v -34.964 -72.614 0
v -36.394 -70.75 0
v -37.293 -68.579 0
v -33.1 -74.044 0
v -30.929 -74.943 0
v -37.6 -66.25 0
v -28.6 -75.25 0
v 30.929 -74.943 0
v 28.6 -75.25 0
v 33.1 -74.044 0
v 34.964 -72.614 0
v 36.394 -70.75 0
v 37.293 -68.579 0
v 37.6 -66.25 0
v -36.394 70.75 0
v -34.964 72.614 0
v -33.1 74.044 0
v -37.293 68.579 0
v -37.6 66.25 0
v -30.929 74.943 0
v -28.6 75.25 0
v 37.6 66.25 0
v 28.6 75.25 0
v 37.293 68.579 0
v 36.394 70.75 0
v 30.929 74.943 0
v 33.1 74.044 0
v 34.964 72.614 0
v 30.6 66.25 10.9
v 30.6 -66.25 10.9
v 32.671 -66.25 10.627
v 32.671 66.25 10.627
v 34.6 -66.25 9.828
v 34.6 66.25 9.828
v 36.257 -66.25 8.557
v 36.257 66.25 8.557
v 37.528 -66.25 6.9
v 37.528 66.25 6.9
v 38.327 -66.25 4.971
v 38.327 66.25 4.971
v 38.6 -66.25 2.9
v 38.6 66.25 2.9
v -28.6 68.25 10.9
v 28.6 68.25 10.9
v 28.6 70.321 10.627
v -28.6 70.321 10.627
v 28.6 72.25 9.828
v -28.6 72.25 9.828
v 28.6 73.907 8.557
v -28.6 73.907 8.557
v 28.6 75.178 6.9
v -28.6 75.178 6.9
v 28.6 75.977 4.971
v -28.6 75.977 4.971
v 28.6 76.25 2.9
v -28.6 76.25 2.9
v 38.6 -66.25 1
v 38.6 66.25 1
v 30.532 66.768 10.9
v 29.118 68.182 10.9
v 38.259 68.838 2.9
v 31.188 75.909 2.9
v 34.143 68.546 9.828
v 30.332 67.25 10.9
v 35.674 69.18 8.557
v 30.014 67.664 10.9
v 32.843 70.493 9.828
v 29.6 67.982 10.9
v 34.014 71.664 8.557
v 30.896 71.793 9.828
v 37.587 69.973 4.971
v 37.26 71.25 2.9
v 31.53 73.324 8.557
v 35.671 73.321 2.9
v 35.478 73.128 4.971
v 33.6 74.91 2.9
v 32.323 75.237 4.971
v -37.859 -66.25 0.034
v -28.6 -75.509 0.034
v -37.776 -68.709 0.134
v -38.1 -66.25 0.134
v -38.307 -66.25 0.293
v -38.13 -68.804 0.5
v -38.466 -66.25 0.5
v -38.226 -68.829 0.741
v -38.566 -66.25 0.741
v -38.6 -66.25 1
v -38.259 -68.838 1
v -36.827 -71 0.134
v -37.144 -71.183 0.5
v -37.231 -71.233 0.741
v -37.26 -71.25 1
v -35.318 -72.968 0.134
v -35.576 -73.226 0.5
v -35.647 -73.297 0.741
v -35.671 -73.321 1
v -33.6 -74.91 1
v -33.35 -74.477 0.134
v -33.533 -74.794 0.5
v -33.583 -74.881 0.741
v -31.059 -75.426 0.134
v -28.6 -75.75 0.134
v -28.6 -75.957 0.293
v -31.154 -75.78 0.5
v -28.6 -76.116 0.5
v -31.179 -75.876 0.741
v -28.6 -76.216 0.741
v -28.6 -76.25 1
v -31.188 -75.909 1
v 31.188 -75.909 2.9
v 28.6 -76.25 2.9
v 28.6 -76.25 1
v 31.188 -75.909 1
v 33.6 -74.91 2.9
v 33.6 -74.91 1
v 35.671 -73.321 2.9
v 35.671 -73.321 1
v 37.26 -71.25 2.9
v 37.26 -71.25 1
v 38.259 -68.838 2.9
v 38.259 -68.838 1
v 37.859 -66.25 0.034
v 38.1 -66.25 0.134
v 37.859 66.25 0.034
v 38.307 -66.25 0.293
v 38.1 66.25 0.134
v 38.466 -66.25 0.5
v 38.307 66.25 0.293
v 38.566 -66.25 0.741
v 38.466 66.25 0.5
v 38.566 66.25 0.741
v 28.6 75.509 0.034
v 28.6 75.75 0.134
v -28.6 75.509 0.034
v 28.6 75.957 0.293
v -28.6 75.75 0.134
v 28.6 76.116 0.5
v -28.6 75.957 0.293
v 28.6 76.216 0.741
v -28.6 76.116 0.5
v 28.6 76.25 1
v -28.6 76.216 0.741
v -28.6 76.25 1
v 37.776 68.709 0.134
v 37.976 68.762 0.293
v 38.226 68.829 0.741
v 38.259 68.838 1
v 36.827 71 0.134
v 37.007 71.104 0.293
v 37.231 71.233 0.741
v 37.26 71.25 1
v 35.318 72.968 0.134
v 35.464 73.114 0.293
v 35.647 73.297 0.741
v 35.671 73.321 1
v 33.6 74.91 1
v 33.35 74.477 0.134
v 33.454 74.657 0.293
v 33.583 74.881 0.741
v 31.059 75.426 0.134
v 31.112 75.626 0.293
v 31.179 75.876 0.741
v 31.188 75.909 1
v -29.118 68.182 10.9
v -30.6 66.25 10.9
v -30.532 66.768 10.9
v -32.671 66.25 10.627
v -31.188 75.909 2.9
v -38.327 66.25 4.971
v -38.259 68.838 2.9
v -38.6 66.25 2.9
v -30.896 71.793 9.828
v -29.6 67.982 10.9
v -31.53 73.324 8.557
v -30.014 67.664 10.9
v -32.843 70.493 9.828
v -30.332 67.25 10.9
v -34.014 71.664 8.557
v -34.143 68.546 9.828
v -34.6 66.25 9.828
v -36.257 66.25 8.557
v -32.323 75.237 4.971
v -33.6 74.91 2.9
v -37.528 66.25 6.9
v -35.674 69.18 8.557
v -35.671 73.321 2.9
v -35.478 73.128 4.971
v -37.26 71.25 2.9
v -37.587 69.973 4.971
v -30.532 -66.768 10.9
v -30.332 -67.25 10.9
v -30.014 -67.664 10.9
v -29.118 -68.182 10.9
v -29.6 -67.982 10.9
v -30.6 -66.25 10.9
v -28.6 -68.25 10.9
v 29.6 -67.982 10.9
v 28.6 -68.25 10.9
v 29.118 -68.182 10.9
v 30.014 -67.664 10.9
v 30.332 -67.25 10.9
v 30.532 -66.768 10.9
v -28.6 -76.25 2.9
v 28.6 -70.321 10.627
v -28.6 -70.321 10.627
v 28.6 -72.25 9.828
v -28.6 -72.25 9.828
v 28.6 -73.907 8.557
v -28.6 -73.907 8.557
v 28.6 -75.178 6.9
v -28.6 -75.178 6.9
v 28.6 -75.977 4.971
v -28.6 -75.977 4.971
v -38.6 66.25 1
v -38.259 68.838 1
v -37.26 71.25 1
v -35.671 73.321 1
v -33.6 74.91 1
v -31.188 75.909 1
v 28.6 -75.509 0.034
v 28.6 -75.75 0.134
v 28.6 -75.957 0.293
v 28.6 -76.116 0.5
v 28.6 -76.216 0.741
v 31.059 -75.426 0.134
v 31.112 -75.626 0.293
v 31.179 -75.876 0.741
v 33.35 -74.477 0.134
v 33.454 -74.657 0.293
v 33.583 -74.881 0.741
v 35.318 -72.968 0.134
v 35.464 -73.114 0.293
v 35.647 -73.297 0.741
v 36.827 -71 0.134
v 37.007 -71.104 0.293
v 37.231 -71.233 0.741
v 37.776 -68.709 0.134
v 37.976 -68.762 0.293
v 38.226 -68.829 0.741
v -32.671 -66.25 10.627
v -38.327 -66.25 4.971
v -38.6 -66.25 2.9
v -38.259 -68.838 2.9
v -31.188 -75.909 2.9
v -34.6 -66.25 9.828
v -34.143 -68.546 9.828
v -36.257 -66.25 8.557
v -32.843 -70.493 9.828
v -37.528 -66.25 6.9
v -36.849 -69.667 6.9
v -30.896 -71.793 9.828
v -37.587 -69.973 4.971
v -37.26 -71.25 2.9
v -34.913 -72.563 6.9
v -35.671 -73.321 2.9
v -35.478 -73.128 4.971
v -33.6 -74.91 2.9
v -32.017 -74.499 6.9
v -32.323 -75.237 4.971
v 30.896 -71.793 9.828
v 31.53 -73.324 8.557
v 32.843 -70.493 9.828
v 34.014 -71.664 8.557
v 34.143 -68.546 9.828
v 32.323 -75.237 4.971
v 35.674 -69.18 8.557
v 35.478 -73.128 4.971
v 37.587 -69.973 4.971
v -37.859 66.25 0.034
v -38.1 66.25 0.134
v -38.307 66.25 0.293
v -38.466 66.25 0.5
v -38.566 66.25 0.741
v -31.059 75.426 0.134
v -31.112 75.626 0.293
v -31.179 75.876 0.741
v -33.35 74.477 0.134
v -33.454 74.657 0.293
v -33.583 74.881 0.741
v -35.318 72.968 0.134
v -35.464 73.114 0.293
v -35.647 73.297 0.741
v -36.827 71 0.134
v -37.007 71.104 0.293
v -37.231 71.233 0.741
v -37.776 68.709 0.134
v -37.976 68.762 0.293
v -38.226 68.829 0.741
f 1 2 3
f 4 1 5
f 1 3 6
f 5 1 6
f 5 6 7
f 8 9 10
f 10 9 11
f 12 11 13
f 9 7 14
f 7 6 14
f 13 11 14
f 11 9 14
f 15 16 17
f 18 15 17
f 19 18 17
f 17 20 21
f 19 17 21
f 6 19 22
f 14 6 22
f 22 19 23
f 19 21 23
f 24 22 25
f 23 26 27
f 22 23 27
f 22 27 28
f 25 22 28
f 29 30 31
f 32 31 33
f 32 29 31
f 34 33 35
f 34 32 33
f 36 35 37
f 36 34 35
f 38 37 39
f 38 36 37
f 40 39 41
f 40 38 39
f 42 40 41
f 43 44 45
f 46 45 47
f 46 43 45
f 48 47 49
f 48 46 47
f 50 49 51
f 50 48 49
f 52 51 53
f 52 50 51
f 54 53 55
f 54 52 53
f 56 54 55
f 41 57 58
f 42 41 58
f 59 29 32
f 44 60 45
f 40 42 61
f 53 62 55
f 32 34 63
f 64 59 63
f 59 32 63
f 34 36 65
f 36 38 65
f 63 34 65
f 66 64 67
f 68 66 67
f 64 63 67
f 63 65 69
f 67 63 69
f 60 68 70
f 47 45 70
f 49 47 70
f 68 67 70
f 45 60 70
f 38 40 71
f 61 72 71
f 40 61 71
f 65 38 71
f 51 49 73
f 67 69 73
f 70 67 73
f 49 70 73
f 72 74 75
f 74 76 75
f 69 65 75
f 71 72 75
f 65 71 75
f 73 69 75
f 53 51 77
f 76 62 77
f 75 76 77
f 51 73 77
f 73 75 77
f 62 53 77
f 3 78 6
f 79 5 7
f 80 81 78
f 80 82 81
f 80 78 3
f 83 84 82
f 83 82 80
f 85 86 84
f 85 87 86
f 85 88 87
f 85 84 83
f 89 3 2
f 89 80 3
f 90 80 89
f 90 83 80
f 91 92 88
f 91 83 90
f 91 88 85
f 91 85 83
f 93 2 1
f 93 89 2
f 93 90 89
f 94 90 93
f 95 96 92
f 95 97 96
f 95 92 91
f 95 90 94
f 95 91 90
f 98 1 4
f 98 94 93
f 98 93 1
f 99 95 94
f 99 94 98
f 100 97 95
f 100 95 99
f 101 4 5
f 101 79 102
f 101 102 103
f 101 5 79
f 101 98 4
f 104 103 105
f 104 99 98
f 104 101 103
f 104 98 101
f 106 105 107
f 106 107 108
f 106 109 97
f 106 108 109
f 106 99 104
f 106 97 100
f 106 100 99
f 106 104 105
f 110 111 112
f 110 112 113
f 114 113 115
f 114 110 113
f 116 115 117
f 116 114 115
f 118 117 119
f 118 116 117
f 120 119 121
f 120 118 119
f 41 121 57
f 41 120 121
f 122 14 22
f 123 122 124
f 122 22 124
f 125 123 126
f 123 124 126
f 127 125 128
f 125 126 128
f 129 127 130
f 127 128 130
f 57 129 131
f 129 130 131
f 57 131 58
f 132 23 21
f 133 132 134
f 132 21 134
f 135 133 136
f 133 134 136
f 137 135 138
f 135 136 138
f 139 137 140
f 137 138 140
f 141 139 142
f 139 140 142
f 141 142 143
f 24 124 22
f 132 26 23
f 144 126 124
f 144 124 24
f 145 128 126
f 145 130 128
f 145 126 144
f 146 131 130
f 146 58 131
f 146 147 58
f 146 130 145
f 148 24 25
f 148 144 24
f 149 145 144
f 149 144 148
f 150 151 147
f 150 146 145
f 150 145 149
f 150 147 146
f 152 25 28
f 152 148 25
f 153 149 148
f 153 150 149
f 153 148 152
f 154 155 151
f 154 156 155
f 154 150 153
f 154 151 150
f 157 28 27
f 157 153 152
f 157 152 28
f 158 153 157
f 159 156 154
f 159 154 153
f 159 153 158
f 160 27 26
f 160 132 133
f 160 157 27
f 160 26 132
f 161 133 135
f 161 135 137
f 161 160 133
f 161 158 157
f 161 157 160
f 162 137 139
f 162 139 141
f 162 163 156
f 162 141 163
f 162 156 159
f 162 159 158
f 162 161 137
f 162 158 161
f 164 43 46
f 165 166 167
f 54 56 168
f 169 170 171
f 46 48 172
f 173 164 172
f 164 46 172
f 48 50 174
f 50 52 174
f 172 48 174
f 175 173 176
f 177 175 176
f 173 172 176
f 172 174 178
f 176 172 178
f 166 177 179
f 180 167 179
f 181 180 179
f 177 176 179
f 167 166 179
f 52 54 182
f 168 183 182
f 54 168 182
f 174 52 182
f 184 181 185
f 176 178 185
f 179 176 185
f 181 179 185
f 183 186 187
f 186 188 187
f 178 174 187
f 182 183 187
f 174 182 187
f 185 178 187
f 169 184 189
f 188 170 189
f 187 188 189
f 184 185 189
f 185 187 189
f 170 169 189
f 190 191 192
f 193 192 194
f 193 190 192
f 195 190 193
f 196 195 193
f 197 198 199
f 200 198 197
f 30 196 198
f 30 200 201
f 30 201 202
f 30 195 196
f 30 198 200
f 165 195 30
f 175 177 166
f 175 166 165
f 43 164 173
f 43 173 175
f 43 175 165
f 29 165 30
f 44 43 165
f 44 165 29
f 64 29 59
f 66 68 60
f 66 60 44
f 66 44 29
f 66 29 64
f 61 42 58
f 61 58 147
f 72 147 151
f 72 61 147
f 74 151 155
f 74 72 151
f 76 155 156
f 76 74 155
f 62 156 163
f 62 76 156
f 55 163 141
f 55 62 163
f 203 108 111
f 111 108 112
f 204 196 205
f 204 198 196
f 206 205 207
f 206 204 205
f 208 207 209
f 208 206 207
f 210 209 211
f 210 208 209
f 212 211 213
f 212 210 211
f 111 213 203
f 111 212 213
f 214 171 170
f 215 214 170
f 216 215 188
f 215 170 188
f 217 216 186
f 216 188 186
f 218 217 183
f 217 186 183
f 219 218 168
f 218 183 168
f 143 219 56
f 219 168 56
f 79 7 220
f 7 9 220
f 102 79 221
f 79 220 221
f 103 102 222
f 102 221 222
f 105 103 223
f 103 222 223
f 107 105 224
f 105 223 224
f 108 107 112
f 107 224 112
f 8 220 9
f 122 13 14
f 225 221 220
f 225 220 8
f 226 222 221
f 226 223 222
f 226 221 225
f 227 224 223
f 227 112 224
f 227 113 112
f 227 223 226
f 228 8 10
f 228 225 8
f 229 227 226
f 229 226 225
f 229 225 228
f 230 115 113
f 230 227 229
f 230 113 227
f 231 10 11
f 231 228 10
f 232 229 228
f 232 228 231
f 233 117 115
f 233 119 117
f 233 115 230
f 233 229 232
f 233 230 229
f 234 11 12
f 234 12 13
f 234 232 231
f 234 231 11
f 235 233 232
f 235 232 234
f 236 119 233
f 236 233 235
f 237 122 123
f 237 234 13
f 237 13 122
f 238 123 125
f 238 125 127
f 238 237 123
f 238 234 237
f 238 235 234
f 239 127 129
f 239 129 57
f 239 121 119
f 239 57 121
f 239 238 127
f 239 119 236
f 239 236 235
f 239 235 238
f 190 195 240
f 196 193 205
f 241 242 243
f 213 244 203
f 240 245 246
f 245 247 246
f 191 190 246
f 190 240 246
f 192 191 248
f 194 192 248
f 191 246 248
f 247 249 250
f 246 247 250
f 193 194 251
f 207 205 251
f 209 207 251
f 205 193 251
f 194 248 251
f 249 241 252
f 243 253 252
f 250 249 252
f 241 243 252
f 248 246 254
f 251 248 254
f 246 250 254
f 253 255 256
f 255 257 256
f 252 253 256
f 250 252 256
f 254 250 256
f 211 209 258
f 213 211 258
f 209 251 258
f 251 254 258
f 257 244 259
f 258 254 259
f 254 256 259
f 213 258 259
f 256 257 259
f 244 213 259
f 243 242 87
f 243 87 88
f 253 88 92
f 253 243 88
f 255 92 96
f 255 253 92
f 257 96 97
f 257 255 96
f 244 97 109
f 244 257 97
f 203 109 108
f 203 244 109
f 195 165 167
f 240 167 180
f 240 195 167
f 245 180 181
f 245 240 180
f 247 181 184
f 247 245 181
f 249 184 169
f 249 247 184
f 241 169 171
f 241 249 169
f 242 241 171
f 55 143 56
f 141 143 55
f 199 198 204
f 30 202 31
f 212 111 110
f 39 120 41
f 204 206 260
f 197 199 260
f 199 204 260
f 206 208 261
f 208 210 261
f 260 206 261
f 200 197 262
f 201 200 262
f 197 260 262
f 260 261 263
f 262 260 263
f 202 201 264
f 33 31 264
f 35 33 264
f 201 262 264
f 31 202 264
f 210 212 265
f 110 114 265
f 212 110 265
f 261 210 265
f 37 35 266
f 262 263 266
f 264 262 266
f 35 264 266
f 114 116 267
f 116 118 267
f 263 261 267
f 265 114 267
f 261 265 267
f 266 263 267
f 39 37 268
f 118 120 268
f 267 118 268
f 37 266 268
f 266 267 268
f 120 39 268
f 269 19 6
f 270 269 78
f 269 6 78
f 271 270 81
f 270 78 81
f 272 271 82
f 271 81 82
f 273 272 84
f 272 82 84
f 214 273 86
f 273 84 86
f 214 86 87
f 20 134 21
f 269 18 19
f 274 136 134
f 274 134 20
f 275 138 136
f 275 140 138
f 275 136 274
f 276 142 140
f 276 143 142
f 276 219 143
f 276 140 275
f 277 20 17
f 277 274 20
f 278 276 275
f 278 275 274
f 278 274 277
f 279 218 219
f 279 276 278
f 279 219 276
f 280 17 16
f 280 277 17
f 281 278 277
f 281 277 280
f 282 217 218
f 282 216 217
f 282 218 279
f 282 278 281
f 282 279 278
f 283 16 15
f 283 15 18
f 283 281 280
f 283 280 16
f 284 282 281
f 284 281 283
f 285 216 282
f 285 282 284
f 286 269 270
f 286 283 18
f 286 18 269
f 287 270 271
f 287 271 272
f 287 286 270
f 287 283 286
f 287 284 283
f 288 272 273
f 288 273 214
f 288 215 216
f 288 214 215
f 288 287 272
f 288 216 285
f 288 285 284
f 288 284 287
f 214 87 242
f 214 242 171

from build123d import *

# Parameters (mm, degrees)
F0_W     = 77.2
F0_H     = 152.5
F1_DEPTH = 10.9
F2_R     = 10
F3_R     = 8
F4_R     = 1


with BuildPart() as f1:
    # F0 (on Top) → F1 (new body)
    with BuildSketch(Plane.XY):
        Rectangle(F0_W, F0_H)
    extrude(amount=F1_DEPTH)

    # F2
    f2_edges = [f1.edges().sort_by_distance(p)[0] for p in [
        (38.6, 76.25, 5.45),
        (-38.6, 76.25, 5.45),
        (-38.6, -76.25, 5.45),
        (38.6, -76.25, 5.45),
    ]]
    fillet(f2_edges, radius=F2_R)

    # F3
    f3_edges = [f1.edges().sort_by_distance(p)[0] for p in [
        (0, -76.25, 10.9),
        (-35.671068, -73.321068, 10.9),
        (35.671068, -73.321068, 10.9),
        (-38.6, 0, 10.9),
        (38.6, 0, 10.9),
        (-35.671068, 73.321068, 10.9),
        (35.671068, 73.321068, 10.9),
        (0, 76.25, 10.9),
    ]]
    fillet(f3_edges, radius=F3_R)

    # F4
    f4_edges = [f1.edges().sort_by_distance(p)[0] for p in [
        (0, -76.25, 0),
        (-35.671068, -73.321068, 0),
        (35.671068, -73.321068, 0),
        (-38.6, 0, 0),
        (38.6, 0, 0),
        (-35.671068, 73.321068, 0),
        (35.671068, 73.321068, 0),
        (0, 76.25, 0),
    ]]
    fillet(f4_edges, radius=F4_R)


solid = f1.part
